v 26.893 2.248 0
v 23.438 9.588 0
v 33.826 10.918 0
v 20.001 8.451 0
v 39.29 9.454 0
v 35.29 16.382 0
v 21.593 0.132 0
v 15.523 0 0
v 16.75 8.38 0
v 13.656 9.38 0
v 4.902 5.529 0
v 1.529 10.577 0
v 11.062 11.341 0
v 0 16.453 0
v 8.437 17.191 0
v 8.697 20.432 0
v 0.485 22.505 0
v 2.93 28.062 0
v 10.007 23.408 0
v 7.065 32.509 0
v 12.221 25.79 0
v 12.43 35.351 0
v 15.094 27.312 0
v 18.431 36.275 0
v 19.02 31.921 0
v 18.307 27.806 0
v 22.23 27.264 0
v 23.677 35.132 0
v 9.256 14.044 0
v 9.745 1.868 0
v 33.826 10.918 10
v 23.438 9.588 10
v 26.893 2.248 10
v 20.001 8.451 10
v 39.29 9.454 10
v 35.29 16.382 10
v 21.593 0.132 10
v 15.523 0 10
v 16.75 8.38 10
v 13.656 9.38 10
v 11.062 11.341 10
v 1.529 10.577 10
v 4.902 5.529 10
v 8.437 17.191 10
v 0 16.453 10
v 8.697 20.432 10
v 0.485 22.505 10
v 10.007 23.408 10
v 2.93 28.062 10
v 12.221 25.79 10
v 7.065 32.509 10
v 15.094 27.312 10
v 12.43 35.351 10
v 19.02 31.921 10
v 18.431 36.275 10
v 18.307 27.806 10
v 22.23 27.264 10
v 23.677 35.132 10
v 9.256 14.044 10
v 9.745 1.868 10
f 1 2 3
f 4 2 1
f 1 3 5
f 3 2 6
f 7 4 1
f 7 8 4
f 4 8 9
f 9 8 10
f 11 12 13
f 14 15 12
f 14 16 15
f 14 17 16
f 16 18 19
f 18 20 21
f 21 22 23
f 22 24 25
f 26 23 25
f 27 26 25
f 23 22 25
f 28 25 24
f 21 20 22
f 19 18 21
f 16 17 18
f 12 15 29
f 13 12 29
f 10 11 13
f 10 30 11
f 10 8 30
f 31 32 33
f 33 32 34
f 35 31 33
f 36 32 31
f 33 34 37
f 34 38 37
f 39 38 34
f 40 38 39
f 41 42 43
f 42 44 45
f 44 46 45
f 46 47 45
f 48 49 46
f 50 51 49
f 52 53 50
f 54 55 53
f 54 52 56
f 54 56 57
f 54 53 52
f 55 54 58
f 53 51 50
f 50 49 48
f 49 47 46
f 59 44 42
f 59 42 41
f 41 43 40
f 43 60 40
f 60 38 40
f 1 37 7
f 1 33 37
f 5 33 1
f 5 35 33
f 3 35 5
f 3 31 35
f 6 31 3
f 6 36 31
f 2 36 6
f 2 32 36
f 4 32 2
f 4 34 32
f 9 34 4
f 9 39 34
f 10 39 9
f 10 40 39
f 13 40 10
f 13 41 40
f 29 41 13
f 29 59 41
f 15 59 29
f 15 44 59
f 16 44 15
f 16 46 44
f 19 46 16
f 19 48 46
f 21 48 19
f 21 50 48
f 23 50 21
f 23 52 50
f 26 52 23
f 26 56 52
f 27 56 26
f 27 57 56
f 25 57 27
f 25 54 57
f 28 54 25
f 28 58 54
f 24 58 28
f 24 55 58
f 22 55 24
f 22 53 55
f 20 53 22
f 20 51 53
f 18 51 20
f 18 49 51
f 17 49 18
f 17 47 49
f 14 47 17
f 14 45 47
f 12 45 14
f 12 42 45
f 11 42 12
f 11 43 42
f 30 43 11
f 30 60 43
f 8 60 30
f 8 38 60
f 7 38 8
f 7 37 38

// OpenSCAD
$fn = 32;

// ----------------------------------------------------------------------
// Eye lug: ring_tail, 10 mm thick
// ----------------------------------------------------------------------

// --- parameters (mm) ---
profile_height = 10;      // extrusion height
profile_points = 30;      // points of the closed outline

profile = [[19.02, 31.921], [23.677, 35.132], [18.431, 36.275], [12.43, 35.351], [7.065, 32.509], [2.93, 28.062], [0.485, 22.505], [0, 16.453], [1.529, 10.577], [4.902, 5.529], [9.745, 1.868], [15.523, 0], [21.593, 0.132], [26.893, 2.248], [39.29, 9.454], [33.826, 10.918], [35.29, 16.382], [23.438, 9.588], [20.001, 8.451], [16.75, 8.38], [13.656, 9.38], [11.062, 11.341], [9.256, 14.044], [8.437, 17.191], [8.697, 20.432], [10.007, 23.408], [12.221, 25.79], [15.094, 27.312], [18.307, 27.806], [22.23, 27.264]];  // single closed polygon, 30 points, counter clockwise

// --- the one profile operation ---
linear_extrude(height = profile_height) polygon(points = profile);
